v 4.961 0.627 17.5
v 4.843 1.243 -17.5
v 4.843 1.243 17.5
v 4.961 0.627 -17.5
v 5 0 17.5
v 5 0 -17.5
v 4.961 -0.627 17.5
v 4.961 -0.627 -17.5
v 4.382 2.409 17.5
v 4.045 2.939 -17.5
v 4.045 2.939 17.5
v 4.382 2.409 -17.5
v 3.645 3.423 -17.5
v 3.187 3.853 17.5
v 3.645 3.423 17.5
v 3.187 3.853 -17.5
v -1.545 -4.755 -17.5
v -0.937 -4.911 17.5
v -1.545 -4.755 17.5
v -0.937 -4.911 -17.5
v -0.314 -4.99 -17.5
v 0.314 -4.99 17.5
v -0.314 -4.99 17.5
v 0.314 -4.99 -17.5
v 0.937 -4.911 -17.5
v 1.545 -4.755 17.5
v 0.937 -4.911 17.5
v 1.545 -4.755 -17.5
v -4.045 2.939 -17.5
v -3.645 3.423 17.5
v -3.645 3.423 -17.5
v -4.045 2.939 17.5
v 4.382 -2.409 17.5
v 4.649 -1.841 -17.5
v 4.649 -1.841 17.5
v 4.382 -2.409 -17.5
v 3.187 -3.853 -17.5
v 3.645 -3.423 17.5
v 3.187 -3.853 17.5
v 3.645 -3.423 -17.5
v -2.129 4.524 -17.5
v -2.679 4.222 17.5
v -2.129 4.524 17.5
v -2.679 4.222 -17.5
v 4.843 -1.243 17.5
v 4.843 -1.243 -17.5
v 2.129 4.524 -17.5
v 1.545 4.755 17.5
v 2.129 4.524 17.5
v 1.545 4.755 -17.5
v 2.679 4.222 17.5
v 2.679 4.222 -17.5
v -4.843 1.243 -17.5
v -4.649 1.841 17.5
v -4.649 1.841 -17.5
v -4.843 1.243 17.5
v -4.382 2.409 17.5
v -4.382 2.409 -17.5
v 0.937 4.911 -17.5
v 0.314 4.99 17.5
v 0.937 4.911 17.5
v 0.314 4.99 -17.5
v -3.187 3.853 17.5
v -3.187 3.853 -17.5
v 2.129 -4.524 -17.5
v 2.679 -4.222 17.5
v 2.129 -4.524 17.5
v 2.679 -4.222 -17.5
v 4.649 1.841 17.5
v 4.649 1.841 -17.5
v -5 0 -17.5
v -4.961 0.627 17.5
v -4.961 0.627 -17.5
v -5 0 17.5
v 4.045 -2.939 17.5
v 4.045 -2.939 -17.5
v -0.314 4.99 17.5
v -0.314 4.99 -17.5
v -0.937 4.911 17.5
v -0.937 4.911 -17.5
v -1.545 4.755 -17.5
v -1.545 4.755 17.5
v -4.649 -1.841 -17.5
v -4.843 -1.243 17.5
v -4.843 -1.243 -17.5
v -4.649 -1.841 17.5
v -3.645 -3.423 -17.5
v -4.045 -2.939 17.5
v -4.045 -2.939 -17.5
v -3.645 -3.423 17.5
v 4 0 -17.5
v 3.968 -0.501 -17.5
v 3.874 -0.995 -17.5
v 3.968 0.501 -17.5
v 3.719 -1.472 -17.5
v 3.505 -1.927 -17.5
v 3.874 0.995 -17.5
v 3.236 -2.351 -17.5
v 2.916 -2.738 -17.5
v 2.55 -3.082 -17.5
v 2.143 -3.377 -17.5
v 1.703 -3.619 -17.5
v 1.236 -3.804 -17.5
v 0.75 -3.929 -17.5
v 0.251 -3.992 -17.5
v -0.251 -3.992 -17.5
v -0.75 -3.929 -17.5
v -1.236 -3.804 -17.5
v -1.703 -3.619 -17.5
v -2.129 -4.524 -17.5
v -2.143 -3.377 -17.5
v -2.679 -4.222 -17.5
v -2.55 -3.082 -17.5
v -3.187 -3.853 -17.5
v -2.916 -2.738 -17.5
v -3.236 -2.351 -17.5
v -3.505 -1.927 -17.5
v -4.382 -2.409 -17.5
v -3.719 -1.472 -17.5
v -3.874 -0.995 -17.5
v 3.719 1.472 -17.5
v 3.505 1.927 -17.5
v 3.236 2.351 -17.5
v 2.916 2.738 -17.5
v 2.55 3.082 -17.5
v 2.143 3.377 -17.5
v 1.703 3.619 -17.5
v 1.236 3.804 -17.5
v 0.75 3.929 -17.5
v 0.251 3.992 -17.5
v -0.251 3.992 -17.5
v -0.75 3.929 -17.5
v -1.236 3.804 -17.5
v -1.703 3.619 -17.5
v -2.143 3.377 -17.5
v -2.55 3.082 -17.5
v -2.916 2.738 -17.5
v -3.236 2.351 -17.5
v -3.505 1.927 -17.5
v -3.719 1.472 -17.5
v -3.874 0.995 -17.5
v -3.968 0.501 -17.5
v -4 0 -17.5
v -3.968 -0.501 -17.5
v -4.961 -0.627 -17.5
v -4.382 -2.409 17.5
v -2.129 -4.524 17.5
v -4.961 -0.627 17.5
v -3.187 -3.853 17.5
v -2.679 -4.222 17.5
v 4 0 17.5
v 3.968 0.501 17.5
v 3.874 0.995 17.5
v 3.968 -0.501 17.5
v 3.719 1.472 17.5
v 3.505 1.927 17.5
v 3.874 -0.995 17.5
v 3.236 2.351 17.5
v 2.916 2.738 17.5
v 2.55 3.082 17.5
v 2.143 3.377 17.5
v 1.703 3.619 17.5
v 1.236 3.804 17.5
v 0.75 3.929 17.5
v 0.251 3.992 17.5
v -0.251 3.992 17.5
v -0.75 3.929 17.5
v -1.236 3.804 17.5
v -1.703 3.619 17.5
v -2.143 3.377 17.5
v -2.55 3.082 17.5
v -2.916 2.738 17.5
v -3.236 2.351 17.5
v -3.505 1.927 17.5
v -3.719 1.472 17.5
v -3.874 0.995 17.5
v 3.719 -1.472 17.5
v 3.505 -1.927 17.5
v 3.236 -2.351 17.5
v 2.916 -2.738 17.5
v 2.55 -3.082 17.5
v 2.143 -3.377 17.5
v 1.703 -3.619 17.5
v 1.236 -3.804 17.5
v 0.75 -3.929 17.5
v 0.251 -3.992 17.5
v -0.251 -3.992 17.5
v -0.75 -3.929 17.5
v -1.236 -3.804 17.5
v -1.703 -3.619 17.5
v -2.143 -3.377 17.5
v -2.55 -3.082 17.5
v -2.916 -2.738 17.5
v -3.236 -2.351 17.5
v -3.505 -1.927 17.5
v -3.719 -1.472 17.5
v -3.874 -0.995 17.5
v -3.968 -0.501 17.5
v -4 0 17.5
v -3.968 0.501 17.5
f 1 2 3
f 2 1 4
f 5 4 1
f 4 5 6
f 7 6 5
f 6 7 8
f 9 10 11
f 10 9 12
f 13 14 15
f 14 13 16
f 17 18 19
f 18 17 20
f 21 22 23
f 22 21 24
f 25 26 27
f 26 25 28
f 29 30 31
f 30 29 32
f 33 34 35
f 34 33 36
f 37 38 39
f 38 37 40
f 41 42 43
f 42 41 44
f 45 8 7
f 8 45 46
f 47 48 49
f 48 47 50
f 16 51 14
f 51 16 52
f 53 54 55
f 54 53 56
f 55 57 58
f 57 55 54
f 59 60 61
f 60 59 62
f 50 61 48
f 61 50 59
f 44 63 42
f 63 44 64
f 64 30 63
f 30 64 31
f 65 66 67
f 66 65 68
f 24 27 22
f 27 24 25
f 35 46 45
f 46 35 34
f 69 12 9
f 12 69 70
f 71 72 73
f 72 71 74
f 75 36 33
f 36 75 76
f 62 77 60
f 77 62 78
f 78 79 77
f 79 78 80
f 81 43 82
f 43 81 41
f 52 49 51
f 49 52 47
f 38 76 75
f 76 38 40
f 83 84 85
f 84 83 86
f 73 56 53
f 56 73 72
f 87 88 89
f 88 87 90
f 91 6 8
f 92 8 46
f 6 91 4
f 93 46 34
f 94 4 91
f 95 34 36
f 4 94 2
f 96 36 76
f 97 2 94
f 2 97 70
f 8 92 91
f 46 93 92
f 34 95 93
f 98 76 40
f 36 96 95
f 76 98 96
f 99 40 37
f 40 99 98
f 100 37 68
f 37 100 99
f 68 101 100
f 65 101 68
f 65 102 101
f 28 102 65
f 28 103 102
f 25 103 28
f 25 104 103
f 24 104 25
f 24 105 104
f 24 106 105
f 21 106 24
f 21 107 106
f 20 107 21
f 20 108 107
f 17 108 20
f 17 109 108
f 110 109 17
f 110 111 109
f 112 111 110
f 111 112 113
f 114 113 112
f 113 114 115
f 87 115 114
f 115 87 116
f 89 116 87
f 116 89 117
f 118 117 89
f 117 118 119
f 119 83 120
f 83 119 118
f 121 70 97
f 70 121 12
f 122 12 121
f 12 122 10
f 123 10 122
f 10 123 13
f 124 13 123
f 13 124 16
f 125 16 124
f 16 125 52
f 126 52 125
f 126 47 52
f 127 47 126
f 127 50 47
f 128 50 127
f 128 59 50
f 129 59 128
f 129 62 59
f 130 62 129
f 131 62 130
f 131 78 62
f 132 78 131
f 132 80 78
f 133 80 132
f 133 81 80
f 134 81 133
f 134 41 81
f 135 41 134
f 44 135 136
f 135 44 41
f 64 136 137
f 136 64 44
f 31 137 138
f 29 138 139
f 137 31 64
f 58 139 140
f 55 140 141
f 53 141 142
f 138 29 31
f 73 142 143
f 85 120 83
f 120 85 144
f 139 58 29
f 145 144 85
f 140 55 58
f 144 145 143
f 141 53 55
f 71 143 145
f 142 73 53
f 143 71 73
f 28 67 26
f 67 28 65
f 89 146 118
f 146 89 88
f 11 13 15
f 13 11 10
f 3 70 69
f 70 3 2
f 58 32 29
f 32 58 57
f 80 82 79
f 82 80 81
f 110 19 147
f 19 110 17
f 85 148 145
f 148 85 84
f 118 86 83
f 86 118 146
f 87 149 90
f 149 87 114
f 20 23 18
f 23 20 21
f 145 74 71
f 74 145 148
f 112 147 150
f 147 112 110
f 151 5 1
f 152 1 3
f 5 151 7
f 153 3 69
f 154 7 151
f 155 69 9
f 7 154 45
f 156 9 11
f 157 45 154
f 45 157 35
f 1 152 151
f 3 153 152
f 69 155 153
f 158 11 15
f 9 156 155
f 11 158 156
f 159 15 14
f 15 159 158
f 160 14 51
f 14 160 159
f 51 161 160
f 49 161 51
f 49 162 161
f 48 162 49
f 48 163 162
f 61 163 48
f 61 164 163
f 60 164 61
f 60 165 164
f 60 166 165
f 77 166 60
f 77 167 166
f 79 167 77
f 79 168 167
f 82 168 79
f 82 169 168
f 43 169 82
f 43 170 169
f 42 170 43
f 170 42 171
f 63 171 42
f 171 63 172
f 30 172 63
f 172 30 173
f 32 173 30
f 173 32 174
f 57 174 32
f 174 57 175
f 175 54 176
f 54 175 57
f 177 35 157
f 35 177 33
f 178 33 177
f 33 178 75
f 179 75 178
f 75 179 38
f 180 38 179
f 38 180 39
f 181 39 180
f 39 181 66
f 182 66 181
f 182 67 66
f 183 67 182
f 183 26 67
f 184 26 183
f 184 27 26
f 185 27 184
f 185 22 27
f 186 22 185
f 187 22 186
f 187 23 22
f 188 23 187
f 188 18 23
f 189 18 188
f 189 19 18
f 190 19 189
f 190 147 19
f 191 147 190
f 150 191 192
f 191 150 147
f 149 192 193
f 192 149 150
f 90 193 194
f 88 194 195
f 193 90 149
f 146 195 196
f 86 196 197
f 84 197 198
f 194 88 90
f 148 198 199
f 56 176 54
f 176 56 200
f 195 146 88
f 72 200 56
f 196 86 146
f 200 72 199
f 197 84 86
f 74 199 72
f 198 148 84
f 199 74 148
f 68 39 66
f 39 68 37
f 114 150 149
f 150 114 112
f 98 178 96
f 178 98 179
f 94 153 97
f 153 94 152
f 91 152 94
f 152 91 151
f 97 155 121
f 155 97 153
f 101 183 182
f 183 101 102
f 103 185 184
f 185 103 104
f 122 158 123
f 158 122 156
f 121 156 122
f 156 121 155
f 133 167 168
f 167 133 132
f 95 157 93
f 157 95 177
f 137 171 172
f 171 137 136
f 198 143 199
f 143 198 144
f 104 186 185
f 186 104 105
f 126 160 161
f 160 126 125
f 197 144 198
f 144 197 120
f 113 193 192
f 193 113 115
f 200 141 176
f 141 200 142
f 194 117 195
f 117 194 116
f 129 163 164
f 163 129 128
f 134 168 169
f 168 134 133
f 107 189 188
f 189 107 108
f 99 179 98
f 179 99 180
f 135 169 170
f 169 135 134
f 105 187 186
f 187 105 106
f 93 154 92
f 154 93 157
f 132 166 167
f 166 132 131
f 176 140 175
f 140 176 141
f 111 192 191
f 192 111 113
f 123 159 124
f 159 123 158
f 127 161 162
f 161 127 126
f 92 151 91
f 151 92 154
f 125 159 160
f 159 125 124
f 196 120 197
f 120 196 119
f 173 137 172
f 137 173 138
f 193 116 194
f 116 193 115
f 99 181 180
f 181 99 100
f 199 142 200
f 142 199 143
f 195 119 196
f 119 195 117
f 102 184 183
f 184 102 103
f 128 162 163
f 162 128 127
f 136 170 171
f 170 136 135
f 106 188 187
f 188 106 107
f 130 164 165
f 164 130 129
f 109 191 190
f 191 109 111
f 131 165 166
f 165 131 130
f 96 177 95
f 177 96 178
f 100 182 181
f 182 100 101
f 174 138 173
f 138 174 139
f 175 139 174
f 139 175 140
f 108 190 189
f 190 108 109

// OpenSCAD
$fn = 50;


difference() {
	union() {
		translate(v = [0, 0, -17.5000000000]) {
			cylinder(h = 35, r = 5.0000000000);
		}
	}
	union() {
		translate(v = [0, 0, -100.0000000000]) {
			cylinder(h = 200, r = 4.0000000000);
		}
	}
}
